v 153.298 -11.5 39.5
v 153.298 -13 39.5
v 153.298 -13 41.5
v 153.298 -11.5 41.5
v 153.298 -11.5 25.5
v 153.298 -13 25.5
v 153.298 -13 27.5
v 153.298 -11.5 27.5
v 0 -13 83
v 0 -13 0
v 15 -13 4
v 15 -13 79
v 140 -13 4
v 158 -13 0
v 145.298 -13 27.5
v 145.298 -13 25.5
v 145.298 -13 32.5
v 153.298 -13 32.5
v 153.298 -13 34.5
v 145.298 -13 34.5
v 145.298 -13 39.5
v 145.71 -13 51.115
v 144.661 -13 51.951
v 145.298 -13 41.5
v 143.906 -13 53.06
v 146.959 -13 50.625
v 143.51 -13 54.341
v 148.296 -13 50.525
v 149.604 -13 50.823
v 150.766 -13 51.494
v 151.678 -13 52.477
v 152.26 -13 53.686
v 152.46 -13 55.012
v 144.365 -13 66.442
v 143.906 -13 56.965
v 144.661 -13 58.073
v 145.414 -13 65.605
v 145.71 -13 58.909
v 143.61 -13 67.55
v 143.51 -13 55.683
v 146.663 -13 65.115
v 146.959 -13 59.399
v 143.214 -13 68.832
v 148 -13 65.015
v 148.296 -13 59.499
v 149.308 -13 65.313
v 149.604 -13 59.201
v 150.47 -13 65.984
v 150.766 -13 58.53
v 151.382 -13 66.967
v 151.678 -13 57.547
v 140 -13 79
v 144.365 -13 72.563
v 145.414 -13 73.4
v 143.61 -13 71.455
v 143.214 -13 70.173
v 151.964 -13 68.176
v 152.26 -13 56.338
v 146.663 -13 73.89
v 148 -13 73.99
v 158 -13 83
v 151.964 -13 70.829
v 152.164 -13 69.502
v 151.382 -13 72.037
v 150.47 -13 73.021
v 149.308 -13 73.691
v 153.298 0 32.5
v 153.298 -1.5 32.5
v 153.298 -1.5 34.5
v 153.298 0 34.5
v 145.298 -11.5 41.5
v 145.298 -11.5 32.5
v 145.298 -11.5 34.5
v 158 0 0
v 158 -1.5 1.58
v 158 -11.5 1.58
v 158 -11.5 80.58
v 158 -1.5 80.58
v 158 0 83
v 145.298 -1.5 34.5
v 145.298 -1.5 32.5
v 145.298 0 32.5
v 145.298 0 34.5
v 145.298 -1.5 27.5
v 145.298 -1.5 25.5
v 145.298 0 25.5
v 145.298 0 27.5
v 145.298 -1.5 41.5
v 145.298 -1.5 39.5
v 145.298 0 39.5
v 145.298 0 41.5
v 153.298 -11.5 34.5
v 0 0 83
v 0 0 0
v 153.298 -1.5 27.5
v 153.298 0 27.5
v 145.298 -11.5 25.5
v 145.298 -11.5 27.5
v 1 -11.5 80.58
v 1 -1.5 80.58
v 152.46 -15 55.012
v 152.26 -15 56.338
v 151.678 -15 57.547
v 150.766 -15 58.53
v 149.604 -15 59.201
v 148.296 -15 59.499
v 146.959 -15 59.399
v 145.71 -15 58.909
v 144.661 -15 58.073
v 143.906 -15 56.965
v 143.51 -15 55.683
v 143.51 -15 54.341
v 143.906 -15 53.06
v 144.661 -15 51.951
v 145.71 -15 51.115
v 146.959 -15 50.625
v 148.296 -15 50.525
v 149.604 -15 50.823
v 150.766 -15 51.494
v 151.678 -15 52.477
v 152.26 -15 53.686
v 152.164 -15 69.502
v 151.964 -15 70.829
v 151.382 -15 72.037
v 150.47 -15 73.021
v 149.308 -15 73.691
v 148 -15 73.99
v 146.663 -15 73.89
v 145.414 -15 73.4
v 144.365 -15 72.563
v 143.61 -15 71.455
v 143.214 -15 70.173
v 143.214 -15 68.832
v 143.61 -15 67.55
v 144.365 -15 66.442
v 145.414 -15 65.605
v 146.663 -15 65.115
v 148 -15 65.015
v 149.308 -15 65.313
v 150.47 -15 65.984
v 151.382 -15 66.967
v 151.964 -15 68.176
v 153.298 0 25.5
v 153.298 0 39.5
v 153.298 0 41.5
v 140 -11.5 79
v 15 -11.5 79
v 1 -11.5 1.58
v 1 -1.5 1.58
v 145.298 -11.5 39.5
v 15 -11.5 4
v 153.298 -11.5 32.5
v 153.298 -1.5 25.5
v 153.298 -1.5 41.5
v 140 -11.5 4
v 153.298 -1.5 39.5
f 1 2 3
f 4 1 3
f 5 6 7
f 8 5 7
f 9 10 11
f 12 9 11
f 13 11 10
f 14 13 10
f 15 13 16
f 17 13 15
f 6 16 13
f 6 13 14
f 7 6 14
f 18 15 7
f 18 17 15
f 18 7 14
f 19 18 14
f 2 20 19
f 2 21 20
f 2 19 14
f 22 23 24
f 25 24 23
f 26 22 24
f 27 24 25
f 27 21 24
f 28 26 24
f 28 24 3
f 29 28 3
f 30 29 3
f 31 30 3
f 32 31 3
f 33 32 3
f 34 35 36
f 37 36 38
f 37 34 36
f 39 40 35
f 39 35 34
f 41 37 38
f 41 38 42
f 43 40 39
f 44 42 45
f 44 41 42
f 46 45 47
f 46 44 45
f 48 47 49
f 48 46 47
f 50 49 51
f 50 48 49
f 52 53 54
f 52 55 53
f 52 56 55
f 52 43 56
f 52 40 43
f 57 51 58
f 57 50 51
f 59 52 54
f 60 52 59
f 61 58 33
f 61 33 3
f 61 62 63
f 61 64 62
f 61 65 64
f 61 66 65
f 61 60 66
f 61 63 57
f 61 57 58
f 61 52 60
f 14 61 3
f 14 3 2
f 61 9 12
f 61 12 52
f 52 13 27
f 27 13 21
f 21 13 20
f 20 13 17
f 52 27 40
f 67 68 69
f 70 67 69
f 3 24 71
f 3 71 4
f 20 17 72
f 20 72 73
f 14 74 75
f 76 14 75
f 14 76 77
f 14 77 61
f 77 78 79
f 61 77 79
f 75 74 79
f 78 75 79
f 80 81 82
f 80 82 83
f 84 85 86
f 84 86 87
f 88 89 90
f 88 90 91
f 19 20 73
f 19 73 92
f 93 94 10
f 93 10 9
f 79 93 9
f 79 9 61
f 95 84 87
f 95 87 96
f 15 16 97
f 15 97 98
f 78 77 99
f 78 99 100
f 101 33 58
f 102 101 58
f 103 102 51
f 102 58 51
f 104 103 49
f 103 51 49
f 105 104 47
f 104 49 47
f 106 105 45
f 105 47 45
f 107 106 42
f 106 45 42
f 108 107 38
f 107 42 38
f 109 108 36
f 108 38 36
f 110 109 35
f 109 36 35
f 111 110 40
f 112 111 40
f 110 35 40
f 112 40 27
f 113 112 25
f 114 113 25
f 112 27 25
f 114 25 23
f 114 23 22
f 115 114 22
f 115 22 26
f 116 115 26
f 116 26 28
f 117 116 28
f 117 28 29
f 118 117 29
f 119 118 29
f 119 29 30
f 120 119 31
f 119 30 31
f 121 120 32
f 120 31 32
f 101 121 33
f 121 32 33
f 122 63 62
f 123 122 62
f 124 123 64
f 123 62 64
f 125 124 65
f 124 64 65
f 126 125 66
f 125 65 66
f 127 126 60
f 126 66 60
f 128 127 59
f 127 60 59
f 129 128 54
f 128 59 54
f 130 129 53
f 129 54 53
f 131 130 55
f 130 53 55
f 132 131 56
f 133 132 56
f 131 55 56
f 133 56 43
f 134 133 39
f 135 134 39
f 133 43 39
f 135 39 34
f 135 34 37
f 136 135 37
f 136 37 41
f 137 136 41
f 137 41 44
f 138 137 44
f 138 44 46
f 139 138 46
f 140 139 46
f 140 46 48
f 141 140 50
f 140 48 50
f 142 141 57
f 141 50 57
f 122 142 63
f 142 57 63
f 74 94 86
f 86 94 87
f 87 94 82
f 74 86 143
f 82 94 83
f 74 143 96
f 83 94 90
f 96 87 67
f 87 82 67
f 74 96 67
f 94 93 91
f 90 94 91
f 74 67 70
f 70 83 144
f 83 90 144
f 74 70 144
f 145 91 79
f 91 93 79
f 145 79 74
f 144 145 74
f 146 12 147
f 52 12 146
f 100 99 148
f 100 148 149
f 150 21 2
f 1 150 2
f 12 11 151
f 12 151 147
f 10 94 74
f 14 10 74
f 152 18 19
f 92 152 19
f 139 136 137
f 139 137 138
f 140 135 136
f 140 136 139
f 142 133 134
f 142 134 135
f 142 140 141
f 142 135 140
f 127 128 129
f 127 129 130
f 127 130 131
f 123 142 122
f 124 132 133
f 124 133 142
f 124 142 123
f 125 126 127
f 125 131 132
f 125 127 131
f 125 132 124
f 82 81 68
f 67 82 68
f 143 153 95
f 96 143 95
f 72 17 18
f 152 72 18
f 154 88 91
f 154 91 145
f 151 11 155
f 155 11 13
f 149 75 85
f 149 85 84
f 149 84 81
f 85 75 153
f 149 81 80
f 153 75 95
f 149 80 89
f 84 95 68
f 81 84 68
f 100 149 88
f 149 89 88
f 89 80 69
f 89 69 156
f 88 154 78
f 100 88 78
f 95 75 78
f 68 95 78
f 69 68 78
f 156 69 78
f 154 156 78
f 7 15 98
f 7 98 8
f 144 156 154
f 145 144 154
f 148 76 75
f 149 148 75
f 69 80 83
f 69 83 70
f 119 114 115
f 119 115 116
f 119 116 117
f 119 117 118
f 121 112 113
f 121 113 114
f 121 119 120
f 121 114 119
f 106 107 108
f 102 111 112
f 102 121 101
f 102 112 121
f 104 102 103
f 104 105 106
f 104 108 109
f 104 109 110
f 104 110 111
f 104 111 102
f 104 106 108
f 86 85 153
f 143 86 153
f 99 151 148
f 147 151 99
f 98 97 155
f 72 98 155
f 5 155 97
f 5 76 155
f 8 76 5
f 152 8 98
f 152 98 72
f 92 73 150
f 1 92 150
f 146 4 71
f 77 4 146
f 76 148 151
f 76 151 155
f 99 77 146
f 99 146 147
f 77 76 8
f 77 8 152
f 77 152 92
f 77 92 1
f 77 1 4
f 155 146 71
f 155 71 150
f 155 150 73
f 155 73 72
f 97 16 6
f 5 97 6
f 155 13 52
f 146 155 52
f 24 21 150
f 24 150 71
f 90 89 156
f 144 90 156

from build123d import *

# Parameters (mm, degrees)
F0_W      = 158
F0_H      = 83
F1_DEPTH  = 13
F2_W      = 125
F2_H      = 75
F3_DEPTH  = 10
F4_W      = 10
F4_H      = 79
F5_DEPTH  = 157
F6_R      = 4.5
F7_DEPTH  = 2
F8_R      = 4.5
F9_DEPTH  = 2
F10_W     = 8
F10_H     = 2
F11_DEPTH = 25


with BuildPart() as f1:
    # F0 (on Front) → F1 (new body)
    with BuildSketch(Plane.XZ):
        with Locations((79, 41.5)):
            Rectangle(F0_W, F0_H)
    extrude(amount=F1_DEPTH)

    # F2 (on face) → F3 (cut)
    with BuildSketch(Plane.XZ.offset(13)):
        with Locations((77.5, 41.5)):
            Rectangle(F2_W, F2_H)
    extrude(amount=-F3_DEPTH, mode=Mode.SUBTRACT)

    # F4 (on face) → F5 (cut)
    with BuildSketch(Plane.YZ.offset(158)):
        with Locations((-6.5, 41.0799)):
            Rectangle(F4_W, F4_H)
    extrude(amount=-F5_DEPTH, mode=Mode.SUBTRACT)

    # F6 (on face) → F7 (join)
    with BuildSketch(Plane.XZ.offset(13)):
        with Locations((147.664174, 69.502406)):
            Circle(F6_R)
    extrude(amount=F7_DEPTH)

    # F8 (on face) → F9 (join)
    with BuildSketch(Plane.XZ.offset(13)):
        with Locations((147.959903, 55.012029)):
            Circle(F8_R)
    extrude(amount=F9_DEPTH)

    # F10 (on face) → F11 (cut)
    with BuildSketch(Plane.XZ.offset(13)):
        with Locations((149.298406, 40.5)):
            Rectangle(F10_W, F10_H)
        with Locations((149.298406, 33.5)):
            Rectangle(F10_W, F10_H)
        with Locations((149.298406, 26.5)):
            Rectangle(F10_W, F10_H)
    extrude(amount=-F11_DEPTH, mode=Mode.SUBTRACT)


solid = f1.part
